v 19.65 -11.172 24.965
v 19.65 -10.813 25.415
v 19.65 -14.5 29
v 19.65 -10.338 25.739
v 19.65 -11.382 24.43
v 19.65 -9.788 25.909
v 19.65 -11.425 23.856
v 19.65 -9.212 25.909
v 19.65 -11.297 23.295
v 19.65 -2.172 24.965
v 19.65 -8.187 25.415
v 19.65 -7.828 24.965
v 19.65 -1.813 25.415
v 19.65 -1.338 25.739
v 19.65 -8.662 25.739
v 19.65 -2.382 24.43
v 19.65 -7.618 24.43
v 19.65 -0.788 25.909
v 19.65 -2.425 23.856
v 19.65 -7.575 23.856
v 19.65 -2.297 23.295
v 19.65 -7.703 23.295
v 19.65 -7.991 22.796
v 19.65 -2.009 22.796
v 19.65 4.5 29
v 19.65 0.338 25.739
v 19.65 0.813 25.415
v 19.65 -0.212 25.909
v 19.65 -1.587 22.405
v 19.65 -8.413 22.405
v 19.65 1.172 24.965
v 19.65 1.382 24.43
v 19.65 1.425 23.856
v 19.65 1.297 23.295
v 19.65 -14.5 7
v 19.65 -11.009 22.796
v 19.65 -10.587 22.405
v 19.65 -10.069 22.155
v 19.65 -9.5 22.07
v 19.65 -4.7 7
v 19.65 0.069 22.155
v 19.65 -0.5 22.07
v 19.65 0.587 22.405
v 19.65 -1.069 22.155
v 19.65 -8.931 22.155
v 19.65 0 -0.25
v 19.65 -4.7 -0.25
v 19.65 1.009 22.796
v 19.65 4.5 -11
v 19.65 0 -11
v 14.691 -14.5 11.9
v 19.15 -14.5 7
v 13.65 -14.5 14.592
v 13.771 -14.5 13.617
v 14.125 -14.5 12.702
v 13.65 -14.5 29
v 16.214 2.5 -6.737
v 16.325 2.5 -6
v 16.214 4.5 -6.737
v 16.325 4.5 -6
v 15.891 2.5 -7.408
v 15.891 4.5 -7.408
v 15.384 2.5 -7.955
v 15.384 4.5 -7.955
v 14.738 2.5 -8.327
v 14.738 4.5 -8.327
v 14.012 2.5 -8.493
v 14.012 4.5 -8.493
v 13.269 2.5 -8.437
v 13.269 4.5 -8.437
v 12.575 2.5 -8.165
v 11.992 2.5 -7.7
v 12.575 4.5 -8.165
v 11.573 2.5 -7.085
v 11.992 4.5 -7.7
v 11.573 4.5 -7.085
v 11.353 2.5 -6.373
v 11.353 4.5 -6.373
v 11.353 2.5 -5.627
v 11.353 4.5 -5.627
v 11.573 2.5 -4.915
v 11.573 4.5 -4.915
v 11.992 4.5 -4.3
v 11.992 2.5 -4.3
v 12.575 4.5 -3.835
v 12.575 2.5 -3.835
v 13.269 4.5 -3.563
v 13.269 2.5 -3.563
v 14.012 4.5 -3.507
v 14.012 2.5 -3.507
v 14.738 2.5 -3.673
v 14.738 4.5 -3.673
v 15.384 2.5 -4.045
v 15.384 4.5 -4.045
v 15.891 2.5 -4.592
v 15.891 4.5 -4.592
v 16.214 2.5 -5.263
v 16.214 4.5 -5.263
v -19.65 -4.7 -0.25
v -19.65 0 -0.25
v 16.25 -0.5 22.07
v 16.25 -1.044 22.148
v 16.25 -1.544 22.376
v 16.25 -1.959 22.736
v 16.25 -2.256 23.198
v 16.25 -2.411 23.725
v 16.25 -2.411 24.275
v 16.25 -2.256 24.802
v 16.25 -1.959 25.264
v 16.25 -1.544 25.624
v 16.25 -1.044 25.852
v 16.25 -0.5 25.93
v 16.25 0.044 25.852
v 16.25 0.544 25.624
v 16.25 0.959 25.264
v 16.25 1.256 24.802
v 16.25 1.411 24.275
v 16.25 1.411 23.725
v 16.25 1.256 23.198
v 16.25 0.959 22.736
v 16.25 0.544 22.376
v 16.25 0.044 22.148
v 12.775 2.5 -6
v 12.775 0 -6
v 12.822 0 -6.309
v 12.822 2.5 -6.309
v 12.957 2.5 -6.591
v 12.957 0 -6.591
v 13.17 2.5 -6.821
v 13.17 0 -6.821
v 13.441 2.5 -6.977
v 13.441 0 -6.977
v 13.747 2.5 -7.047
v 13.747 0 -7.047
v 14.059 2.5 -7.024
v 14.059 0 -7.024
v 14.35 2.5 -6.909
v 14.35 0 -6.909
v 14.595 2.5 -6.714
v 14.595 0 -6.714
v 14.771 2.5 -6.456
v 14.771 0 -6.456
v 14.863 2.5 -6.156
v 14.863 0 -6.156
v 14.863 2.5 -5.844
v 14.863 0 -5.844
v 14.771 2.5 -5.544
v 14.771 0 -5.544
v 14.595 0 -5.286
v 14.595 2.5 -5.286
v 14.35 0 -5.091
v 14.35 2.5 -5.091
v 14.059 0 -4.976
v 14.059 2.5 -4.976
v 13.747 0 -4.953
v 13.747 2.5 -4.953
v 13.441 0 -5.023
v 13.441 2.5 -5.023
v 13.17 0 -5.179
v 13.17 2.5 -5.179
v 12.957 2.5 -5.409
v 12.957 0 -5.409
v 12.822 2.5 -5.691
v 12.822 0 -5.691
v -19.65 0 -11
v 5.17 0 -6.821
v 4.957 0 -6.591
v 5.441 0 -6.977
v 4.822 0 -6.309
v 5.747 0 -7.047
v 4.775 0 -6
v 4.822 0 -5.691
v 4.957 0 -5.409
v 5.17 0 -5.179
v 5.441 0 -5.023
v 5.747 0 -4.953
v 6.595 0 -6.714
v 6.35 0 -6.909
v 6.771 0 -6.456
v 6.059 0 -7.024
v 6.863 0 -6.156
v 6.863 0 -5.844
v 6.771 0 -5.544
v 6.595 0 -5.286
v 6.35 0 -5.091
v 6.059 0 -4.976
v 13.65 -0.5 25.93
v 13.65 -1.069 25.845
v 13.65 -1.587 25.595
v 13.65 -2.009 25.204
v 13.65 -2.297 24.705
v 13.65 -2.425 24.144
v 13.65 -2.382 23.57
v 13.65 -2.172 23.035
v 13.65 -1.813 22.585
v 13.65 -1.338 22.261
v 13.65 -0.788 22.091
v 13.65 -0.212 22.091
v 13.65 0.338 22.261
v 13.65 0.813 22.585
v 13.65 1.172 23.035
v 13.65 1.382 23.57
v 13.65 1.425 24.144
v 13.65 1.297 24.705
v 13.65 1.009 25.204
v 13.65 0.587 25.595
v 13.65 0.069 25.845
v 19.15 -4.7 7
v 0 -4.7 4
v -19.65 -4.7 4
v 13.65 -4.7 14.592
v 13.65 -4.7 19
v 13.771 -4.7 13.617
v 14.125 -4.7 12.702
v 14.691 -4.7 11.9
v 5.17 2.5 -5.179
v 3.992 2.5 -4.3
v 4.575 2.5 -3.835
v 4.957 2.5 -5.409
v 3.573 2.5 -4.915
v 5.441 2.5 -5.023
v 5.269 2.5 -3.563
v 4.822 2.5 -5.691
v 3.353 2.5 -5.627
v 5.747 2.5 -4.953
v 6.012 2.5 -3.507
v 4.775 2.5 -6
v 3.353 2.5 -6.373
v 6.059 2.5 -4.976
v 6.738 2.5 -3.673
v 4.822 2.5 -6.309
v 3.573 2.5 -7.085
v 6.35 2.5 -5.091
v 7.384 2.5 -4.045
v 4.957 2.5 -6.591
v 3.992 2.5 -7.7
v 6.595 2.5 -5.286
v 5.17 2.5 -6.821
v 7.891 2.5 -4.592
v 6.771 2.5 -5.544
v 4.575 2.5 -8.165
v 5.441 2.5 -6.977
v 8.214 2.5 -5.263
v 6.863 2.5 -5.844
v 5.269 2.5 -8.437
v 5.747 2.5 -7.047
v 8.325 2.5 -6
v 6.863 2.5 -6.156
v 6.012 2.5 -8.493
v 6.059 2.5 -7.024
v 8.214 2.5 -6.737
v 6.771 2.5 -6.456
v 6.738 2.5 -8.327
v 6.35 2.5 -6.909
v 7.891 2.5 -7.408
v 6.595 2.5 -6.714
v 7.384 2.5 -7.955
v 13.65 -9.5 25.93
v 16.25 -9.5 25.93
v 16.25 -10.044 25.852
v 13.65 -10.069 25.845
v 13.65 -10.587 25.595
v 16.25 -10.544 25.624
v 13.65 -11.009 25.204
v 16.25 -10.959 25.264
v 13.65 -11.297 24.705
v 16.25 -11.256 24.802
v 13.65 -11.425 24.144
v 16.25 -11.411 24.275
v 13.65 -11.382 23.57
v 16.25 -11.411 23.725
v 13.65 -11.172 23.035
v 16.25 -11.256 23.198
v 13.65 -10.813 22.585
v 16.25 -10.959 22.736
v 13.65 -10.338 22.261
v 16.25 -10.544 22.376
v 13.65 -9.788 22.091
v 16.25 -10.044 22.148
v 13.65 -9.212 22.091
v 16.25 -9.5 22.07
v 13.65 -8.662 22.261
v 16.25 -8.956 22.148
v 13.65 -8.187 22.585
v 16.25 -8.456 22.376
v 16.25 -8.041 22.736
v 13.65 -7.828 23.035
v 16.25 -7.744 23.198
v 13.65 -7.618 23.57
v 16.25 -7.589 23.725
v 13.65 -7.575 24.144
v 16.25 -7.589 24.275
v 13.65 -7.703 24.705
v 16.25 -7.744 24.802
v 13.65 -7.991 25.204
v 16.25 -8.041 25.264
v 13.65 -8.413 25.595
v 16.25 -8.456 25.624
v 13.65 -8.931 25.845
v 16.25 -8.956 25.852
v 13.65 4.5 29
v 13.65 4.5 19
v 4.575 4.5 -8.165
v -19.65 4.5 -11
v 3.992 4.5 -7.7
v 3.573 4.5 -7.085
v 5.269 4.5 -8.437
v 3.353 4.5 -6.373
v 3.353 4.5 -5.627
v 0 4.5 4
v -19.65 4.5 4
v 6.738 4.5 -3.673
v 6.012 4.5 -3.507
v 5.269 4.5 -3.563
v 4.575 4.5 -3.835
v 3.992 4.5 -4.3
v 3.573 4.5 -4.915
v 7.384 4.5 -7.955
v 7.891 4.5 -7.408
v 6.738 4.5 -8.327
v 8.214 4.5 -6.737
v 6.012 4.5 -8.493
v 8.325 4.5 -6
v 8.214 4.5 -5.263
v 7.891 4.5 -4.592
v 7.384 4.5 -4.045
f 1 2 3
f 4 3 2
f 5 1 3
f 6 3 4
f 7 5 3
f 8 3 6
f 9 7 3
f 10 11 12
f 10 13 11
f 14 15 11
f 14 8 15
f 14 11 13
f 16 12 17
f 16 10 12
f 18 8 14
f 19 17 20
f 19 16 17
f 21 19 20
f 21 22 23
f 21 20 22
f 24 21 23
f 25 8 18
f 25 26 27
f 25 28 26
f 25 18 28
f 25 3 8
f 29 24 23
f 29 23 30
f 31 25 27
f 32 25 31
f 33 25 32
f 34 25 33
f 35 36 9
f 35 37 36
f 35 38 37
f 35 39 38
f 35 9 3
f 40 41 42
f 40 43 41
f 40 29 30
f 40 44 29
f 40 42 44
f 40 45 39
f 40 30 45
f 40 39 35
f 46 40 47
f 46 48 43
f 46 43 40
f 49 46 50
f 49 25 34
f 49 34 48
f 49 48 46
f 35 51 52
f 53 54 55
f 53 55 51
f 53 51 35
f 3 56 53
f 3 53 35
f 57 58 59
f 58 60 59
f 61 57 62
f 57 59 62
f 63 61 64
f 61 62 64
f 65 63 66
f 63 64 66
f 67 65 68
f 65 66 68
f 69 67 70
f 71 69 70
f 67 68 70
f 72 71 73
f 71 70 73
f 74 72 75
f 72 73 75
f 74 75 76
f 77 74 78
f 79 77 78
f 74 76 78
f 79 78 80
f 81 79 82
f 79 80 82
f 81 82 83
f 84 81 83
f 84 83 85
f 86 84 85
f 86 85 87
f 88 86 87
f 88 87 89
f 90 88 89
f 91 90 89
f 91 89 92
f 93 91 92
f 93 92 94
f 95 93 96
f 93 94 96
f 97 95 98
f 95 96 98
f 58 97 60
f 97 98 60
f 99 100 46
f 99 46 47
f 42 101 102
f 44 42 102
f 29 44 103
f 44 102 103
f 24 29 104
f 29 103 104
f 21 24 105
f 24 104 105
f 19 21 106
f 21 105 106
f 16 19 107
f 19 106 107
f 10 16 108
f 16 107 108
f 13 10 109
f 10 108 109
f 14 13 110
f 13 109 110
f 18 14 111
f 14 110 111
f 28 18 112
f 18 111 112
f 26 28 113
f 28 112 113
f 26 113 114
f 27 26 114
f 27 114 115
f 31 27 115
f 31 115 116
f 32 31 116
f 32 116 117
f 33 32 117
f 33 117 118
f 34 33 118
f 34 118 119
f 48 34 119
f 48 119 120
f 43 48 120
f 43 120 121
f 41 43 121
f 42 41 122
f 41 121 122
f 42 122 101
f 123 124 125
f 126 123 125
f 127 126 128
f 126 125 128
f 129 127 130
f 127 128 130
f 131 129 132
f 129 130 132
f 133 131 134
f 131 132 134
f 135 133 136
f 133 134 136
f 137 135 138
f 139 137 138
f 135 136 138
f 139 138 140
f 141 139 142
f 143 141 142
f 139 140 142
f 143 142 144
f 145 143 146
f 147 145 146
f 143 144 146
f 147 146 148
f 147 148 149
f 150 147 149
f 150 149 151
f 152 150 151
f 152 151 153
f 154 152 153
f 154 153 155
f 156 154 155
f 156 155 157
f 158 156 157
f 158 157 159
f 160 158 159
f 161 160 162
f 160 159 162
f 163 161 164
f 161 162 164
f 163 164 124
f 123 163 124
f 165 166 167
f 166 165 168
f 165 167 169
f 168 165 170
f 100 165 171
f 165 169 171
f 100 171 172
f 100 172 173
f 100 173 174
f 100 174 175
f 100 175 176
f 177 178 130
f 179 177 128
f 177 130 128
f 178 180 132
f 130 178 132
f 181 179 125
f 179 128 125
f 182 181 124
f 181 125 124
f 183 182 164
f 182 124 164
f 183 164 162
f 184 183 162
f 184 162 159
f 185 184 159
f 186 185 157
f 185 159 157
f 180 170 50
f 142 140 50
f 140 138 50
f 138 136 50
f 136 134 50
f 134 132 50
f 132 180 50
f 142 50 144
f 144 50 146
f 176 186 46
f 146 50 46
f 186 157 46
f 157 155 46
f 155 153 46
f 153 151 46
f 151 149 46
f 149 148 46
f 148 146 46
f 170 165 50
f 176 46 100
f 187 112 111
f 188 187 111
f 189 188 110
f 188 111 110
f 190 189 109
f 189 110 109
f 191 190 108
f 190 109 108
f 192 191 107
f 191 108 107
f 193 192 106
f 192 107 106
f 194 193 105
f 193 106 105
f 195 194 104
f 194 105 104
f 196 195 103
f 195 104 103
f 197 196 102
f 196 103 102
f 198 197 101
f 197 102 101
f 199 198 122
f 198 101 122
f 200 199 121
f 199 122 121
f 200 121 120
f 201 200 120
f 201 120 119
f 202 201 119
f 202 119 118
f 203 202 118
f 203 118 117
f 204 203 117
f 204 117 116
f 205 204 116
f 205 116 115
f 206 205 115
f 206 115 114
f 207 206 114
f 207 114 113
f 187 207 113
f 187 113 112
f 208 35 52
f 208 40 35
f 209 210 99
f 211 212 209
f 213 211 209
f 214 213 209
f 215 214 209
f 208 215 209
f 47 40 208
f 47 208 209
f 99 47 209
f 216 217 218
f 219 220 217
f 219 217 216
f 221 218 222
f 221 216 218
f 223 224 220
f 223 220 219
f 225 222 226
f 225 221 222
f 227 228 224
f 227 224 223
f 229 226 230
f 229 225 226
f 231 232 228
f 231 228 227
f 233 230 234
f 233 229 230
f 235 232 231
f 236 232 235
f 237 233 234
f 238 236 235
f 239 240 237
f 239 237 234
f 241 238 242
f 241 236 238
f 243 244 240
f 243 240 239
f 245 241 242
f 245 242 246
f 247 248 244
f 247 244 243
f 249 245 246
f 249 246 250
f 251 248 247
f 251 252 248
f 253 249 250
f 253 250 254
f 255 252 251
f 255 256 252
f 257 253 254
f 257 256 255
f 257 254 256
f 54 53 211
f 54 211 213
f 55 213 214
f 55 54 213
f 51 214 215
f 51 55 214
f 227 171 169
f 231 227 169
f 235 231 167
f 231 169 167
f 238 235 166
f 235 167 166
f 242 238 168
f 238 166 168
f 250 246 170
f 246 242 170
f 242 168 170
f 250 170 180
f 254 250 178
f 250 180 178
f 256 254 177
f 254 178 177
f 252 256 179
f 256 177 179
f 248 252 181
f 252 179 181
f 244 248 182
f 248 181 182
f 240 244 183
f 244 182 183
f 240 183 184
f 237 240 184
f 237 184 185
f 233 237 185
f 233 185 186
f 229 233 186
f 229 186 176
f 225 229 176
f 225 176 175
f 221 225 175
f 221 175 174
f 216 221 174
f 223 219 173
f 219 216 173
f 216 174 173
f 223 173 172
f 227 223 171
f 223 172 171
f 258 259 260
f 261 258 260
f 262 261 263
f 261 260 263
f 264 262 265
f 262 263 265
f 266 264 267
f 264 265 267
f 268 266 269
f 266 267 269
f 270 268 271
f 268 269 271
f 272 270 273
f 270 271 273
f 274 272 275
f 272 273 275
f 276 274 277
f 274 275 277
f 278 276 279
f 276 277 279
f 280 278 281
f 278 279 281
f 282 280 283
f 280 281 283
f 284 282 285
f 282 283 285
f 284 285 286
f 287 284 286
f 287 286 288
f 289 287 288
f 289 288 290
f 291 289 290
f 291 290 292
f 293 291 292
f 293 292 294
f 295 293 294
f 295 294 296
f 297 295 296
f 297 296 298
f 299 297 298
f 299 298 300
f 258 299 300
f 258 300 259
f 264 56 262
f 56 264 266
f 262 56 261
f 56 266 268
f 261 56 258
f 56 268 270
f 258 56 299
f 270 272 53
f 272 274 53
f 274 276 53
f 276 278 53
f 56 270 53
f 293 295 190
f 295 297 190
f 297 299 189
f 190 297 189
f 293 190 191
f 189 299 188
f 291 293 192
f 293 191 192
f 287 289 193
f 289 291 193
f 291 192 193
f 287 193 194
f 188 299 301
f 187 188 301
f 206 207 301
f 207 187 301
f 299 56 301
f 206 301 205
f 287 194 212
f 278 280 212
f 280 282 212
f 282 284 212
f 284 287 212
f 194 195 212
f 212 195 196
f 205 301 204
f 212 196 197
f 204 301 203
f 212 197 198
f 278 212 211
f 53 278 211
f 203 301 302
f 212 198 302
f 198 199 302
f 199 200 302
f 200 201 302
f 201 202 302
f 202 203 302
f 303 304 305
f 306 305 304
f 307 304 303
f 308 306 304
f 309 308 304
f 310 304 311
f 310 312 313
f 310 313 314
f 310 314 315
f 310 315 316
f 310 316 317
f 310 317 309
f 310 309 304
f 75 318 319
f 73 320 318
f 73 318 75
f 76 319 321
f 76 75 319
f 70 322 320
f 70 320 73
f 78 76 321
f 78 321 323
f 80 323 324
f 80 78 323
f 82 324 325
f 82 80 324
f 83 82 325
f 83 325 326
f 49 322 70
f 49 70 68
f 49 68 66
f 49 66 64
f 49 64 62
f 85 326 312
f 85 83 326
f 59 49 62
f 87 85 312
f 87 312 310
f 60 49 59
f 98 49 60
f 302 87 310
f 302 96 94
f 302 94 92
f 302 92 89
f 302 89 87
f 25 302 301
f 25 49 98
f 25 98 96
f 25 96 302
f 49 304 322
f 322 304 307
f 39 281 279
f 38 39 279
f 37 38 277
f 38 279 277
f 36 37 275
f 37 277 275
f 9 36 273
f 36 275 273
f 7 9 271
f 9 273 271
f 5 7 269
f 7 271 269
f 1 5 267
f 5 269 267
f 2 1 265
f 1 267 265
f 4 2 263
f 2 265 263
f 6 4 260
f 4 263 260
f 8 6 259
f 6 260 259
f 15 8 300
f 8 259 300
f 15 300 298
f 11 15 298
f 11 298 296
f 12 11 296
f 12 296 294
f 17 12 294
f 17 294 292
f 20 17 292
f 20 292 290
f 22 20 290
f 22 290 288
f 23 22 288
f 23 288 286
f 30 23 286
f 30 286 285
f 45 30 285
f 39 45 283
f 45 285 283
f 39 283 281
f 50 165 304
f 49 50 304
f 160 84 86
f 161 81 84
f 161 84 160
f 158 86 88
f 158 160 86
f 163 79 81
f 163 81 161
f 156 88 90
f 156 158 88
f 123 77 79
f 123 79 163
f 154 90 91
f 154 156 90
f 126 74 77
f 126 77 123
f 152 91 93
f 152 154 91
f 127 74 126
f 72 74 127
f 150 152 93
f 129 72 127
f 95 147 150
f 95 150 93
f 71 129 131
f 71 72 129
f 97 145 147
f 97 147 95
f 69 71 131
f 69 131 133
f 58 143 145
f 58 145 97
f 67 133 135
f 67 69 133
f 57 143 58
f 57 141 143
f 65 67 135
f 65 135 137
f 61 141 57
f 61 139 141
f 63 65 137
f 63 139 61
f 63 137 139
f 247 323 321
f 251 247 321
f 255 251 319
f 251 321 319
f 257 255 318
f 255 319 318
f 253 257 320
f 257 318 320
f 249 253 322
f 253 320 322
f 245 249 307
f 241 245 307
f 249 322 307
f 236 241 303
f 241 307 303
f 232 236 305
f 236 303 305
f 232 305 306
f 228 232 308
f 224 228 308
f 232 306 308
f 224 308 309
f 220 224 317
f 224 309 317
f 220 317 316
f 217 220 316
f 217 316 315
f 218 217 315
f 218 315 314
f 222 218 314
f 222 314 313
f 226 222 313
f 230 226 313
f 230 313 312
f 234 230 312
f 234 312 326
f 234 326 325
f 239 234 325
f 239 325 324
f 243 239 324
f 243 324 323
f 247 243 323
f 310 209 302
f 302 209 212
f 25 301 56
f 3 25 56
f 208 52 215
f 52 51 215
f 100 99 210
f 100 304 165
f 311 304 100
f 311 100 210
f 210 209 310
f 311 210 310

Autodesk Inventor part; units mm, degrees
ref_plane "YZ Plane" through (0, 0, 0) normal (1, 0, 0) x (0, 1, 0)
ref_plane "XZ Plane" through (0, 0, 0) normal (0, 1, 0) x (-1, 0, 0)
ref_plane "XY Plane" through (0, 0, 0) normal (0, 0, 1) x (1, 0, 0)
sketch "Sketch1" plane through (0, 0, 0) normal (0, 1, 0) x (-1, 0, 0)
  line L0 (0, 0) -> (-19.65, 0)
  line L1 (-19.65, 0) -> (-19.65, -12)
  line L2 (-19.65, -12) -> (0, -12)
  line L3 (0, -12) -> (0, 0)
  line L4 (0, 0) -> (0, -6)
  line L5 (0, -6) -> (-5.825, -6)
  line L6 (-5.825, -6) -> (-13.825, -6)
  circle A0 centre (-5.825, -6) radius 1.05
  circle A1 centre (-13.825, -6) radius 1.05
  dimension "d0" = 19.65
  dimension "d1" = 12
  dimension "d2" = 6
  dimension "d3" = 5.825
  dimension "d4" = 8
  dimension "d5" = 2.1
  dimension "d6" = 2.1
extrude "Extrusion1" add sketch "Sketch1" along normal blind 4.5
sketch "Sketch2" plane through (0, 4.5, 0) normal (0, 1, 0) x (1, 0, 0)
  line L0 (0, 0) -> (19.65, 0) projected
  line L1 (0, 0) -> (0, 6)
  line L2 (0, 12) -> (0, 0) projected
  line L3 (0, 6) -> (5.825, 6)
  line L4 (5.825, 6) -> (13.825, 6)
  circle A0 centre (5.825, 6) radius 2.5
  circle A1 centre (13.825, 6) radius 2.5
  dimension "d9" = 5.825
  dimension "d10" = 8
  dimension "d11" = 5
  dimension "d12" = 5
extrude "Extrusion2" cut sketch "Sketch2" against normal blind 2
sketch "Sketch3" plane through (0, 4.5, 0) normal (0, 1, 0) x (1, 0, 0)
  line L0 (19.65, 12) -> (0, 12) projected
  line L1 (0, 0) -> (3, 0)
  line L2 (3, 0) -> (3, 12)
  line L3 (3, 12) -> (0, 12)
  line L4 (0, 12) -> (0, 0)
  dimension "d15" = 3
extrude "Extrusion3" add sketch "Sketch3" along normal blind 11.5
sketch "Sketch4" plane through (0, 16, 0) normal (0, 1, 0) x (1, 0, 0)
  line L0 (0, 0) -> (3, 0) projected
  line L1 (0, 0) -> (3, 0)
  line L2 (3, 0) -> (3, 1)
  line L3 (3, 0) -> (3, 12) projected
  line L4 (3, 1) -> (2, 1)
  line L5 (2, 1) -> (2, 11)
  line L6 (2, 11) -> (3, 11)
  line L7 (3, 1) -> (3, 11)
  dimension "d18" = 1
  dimension "d19" = 1
  dimension "d20" = 10
extrude "Extrusion4" cut sketch "Sketch4" against normal blind 11.5
sketch "Sketch6" plane through (0, 0, 0) normal (0, 0, 1) x (1, 0, 0)
  line L0 (0, 0) -> (19.65, 0) projected
  line L1 (0, 0) -> (5, 0)
  line L2 (5, 0) -> (5, 4.5)
  line L3 (3.325, 4.5) -> (8.325, 4.5) projected
  line L4 (19.65, 0) -> (19.65, 4.5) projected
  line L5 (19.65, 4.5) -> (19.65, 0)
  line L6 (19.65, 0) -> (5, 0)
  line L7 (5, 4.5) -> (19.65, 4.5)
  line L8 (19.65, 0) -> (5, 0)
  line L9 (19.65, 4.5) -> (19.65, -3.5)
  line L10 (5, 4.5) -> (-3, 4.5)
  line L11 (3, 4.5) -> (19.65, 4.5) projected
  line L12 (5, 4.5) -> (5, -3.5)
  line L13 (5, -3.5) -> (19.65, -3.5)
  dimension "d24" = 5
  dimension "d25" = 8
  dimension "d26" = 8
  dimension "d27" = 8
extrude "Extrusion5" add sketch "Sketch6" along normal blind 2
sketch "Sketch7" plane through (0, 0, 2) normal (0, 0, 1) x (1, 0, 0)
  line L0 (5, 0) -> (5, -3.5) projected
  line L1 (5, -3.5) -> (11, -3.5)
  line L2 (11, -3.5) -> (11, 4.5)
  line L3 (11, 4.5) -> (5, 4.5)
  line L4 (5, 4.5) -> (5, -3.5)
  line L5 (5, -3.5) -> (19.65, -3.5) projected
  line L6 (5, -3.5) -> (11, -3.5)
  line L7 (11, -3.5) -> (11, -14.5)
  line L8 (11, -14.5) -> (5, -14.5)
  line L9 (5, -14.5) -> (5, -3.5)
  point P0 (0, 0)
  dimension "d30" = 6
  dimension "d31" = 8
  dimension "d32" = 6
  dimension "d33" = 11
extrude "Extrusion6" add sketch "Sketch7" along normal blind 27
sketch "Sketch8" plane through (11, -14.5, 2) normal (1, 0, 0) x (0, 0, -1)
  line L0 (0, 11) -> (0, 0) projected
  line L1 (0, 0) -> (-27, 0)
  line L2 (0, 0) -> (-27, 0) projected
  line L3 (-27, 0) -> (-27, 5)
  line L4 (2, 19) -> (-27, 19) projected
  circle A0 centre (-27, 5) radius 2
  line L5 (0, 19) -> (-27, 19)
  line L6 (-27, 19) -> (-27, 14)
  circle A1 centre (-27, 14) radius 2
  line L7 (-27, 14) -> (-22, 14)
  line L8 (-27, 5) -> (-22, 5)
  circle A2 centre (-22, 14) radius 1.9305
  circle A3 centre (-22, 5) radius 1.9305
  point P0 (2, 14.5)
  point P1 (-25, 14)
  point P2 (-27, 16)
  point P3 (-25, 5)
  point P4 (-27, 3)
  dimension "d36" = 27
  dimension "d37" = 5
  dimension "d39" = 4
  dimension "d41" = 27
  dimension "d42" = 5
  dimension "d43" = 4
  dimension "d44" = 5
  dimension "d45" = 5
  dimension "d46" = 3.861
  dimension "d47" = 3.861
sketch "Sketch10" plane through (11, -14.5, 2) normal (1, 0, 0) x (0, 0, -1)
  line L0 (0, 0) -> (-27, 0) projected
  line L1 (0, 0) -> (-5, 0)
  line L2 (-5, 0) -> (-5, 11)
  line L3 (-5, 11) -> (0, 11)
  line L4 (0, 11) -> (0, 0)
  point P0 (2, 14.5)
  point P1 (-5, 0)
  dimension "d52" = 5
  dimension "d53" = 11
extrude "Extrusion9" cut sketch "Sketch10" against normal blind 20
sketch "Sketch11" plane through (11, -3.5, 2) normal (1, 0, 0) x (0, 0, -1)
  line L0 (-27, 8) -> (0, 8)
  line L1 (0, 8) -> (0, -11)
  line L2 (0, -11) -> (-27, -11)
  line L3 (-27, -11) -> (-27, 8)
  line L4 (-5, 0) -> (0, 0) projected
  line L5 (-5, 0) -> (0, 0)
  line L6 (0, 0) -> (0, -11)
  line L7 (0, -11) -> (-5, -11)
  line L8 (-5, -11) -> (-5, 0)
  point P0 (2, 3.5)
  dimension "d56" = 27
  dimension "d57" = 19
extrude "Extrusion10" add sketch "Sketch11" along normal blind 16 contours L0 L1 L4 L8 L2 L3
sketch "Sketch13" plane through (5, -3.5, 0) normal (-1, 0, 0) x (0, 0, 1)
  line L0 (0, 3.5) -> (0, 8) projected
  line L1 (0, 8) -> (30.196, 8)
  line L2 (30.196, 8) -> (30.196, -11.8084)
  line L3 (30.196, -11.8084) -> (0, -11.8084)
  line L4 (0, -11.8084) -> (0, 8)
extrude "Extrusion12" cut sketch "Sketch13" against normal blind 12.5
extrude "Extrusion13" cut sketch "Sketch8" along normal blind 30 contours A2 | A3
sketch "Sketch14" plane through (0, 0, -12) normal (-1, 0, 0) x (0, 0, 1)
  line L0 (12, 4.5) -> (12, 16) projected
  line L1 (12, 4.5) -> (16, 4.5)
  line L2 (14, 4.5) -> (41, 4.5) projected
  line L3 (12, 4.5) -> (12, 0) projected
  line L4 (16, 4.5) -> (12, 4.5)
  line L5 (12, 4.5) -> (12, 0)
  line L6 (12, 0) -> (16, 0)
  line L7 (16, 0) -> (16, 4.5)
  line L8 (16, 0) -> (12, 0)
  line L9 (12, 0) -> (12, -3.5)
  line L10 (12, -3.5) -> (16, -3.5)
  line L11 (16, -3.5) -> (16, 0)
  dimension "d68" = 4
  dimension "d69" = 3.5
extrude "Extrusion14" add sketch "Sketch14" against normal blind 27
sketch "Sketch15" plane through (27, -3.5, 2) normal (1, 0, 0) x (0, 0, -1)
  line L0 (-27.7224, 9.1153) -> (2, 9.1153)
  line L1 (2, 9.1153) -> (2, -11.9629)
  line L2 (2, -11.9629) -> (-27.7224, -11.9629)
  line L3 (-27.7224, -11.9629) -> (-27.7224, 9.1153)
  point P0 (2, 3.5)
extrude "Extrusion15" cut sketch "Sketch15" against normal blind 3.5
sketch "Sketch16" plane through (0, 0, 0) normal (0, 0, -1) x (-1, 0, 0)
  line L0 (-23.5, 4.5) -> (-23.5, -3.5) projected
  line L1 (-19.65, 0) -> (0, 0) projected
  line L2 (-23.5, 4.5) -> (-19.65, 4.5)
  line L3 (-19.65, 4.5) -> (-19.65, 0)
  line L4 (-19.65, 0) -> (-23.5, 0)
  line L5 (-23.5, 0) -> (-23.5, 4.5)
  line L6 (0, -3.5) -> (-23.5, -3.5) projected
  line L7 (-23.5, -3.5) -> (0, -3.5)
  line L8 (0, -3.5) -> (0, 0)
  line L9 (0, 0) -> (-23.5, 0)
  line L10 (-23.5, 0) -> (-23.5, -3.5)
extrude "Extrusion16" cut sketch "Sketch16" against normal blind 0.25
chamfer "Chamfer2" distance 11.5 angle 22.5 1 edges at (3, 4.5, -0.5) measured on face at (3, 8.3333, -0.6667)
chamfer "Chamfer3" distance 11.5 angle 22.5 1 edges at (3, 4.5, -11.5) measured on face at (3, 8.3333, -11.3333)
sketch "Sketch17" plane through (17.5, -3.5, 0) normal (-1, 0, 0) x (0, 0, 1)
  line L0 (4, 8) -> (0, 8) projected
  line L1 (4, 8) -> (29, 8) projected
  line L2 (4, 8) -> (29, 8)
  line L3 (29, -11) -> (7, -11) projected
  line L4 (29, 8) -> (29, -11)
  line L5 (29, -11) -> (7, -11)
  line L6 (7, -11) -> (7, 0) projected
  line L7 (7, -11) -> (7, 0)
  line L8 (7, 0) -> (4, 0) projected
  line L9 (7, 0) -> (4, 0)
  line L10 (4, 0) -> (4, 8) projected
  line L11 (4, 0) -> (4, 8)
  circle A0 centre (24, 3) radius 1.9305 projected
  circle A1 centre (24, 3) radius 1.9305
  circle A2 centre (24, -6) radius 1.9305 projected
  circle A3 centre (24, -6) radius 1.9305
  point P0 (0, 3.5)
extrude "Extrusion17" add sketch "Sketch17" along normal blind 7.75
sketch "Sketch19" plane through (19.65, 0, -12) normal (1, 0, 0) x (0, 0, -1)
  line L0 (3.0047, 17.6779) -> (-43.6886, 17.6779)
  line L1 (-43.6886, 17.6779) -> (-43.6886, -24.1526)
  line L2 (-43.6886, -24.1526) -> (3.0047, -24.1526)
  line L3 (3.0047, -24.1526) -> (3.0047, 17.6779)
  point P0 (-12, 0)
extrude "Extrusion18" cut sketch "Sketch19" along normal blind 7.75
sketch "Sketch20" plane through (19.65, 0, -12) normal (1, 0, 0) x (0, 0, -1)
  line L0 (-16, -3.5) -> (-19, -3.5) projected
  line L1 (-41, 4.5) -> (-16, 4.5) projected
  line L2 (-16, -3.5) -> (-41, -3.5)
  line L3 (-41, -3.5) -> (-41, 4.5)
  line L4 (-41, 4.5) -> (-16, 4.5)
  line L5 (-16, 4.5) -> (-16, -3.5)
  line L6 (-19, -3.5) -> (-19, -14.5) projected
  line L7 (0, 4.5) -> (-41, 4.5) projected
  line L8 (-19, -14.5) -> (-41, -14.5)
  line L9 (-41, -14.5) -> (-41, 4.5)
  line L10 (-41, 4.5) -> (-19, 4.5)
  line L11 (-19, 4.5) -> (-19, -14.5)
  point P0 (-12, 0)
extrude "Extrusion19" cut sketch "Sketch20" against normal blind 3.4
sketch "Sketch22" plane through (9.75, -3.5, 0) normal (-1, 0, 0) x (0, 0, 1)
  line L0 (29, 8) -> (4, 8) projected
  line L1 (29, -11) -> (29, 8) projected
  line L2 (4, 8) -> (29, 8)
  line L3 (29, 8) -> (29, -11)
  line L4 (29, -11) -> (4, -11)
  line L5 (4, -11) -> (4, 8)
  point P0 (0, 3.5)
extrude "Extrusion21" cut sketch "Sketch22" against normal blind 0.5
chamfer "Chamfer6" distance 6 angle 45 1 edges at (10.25, 0.5, 4)
sketch "Sketch23" plane through (10.25, -3.5, 0) normal (-1, 0, 0) x (0, 0, 1)
  line L0 (0.25, 0) -> (4, 0) projected
  line L1 (29, -11) -> (0.25, -11)
  line L2 (0.25, -11) -> (0.25, 0)
  line L3 (0.25, 0) -> (29, 0)
  line L4 (29, 0) -> (29, -11)
  point P0 (0, 3.5)
extrude "Extrusion22" cut sketch "Sketch23" along normal blind 6
chamfer "Chamfer7" distance 3 angle 45 1 edges at (10.25, -9, 7)
sketch "Sketch24" plane through (2, 4.5, -11) normal (0, 0, 1) x (1, 0, 0)
  line L0 (0, 11.5) -> (0, 0) projected
  line L1 (0, 11.5) -> (1, 11.5) projected
  line L2 (0, 11.5) -> (1, 11.5)
  line L3 (1, 11.5) -> (5.7635, 0) projected
  line L4 (1, 11.5) -> (5.7635, 0)
  line L5 (5.7635, 0) -> (0, 0)
  line L6 (0, 0) -> (0, 11.5)
  point P0 (-2, -4.5)
extrude "Extrusion23" add sketch "Sketch24" along normal blind 1
sketch "Sketch25" plane through (19.65, 0, -12) normal (0, 0, -1) x (-1, 0, 0)
  line L0 (11.8865, 4.5) -> (16.65, 16) projected
  line L1 (11.8865, 4.5) -> (21.5602, 4.5)
  line L2 (21.5602, 4.5) -> (21.5602, 16.6717)
  line L3 (21.5602, 16.6717) -> (11.8865, 16.6717)
  line L4 (11.8865, 16.6717) -> (11.8865, 4.5)
  point P0 (19.65, 0)
extrude "Extrusion24" cut sketch "Sketch25" against normal blind 1
sketch "Sketch26" plane through (19.65, 0, -12) normal (0, 0, -1) x (-1, 0, 0)
  line L0 (23.0227, -5.5896) -> (-3.5888, -5.5896)
  line L1 (-3.5888, -5.5896) -> (-3.5888, 1.5983)
  line L2 (23.0227, 1.5983) -> (23.0227, -5.5896)
  line L3 (23.0227, -5.5896) -> (-3.178, -5.5896)
  line L4 (-3.178, -5.5896) -> (-3.178, 11.4907)
  line L5 (-3.178, 11.4907) -> (23.0227, 11.4907)
  line L6 (23.0227, 11.4907) -> (23.0227, -5.5896)
  point P0 (19.65, 0)
extrude "Extrusion25" cut sketch "Sketch26" against normal blind 1
sketch "Sketch27" plane through (0, 0, 0.25) normal (0, 0, -1) x (-1, 0, 0)
  line L0 (-19.65, 0) -> (0, 0) projected
  line L1 (-19.65, -3.5) -> (-16.25, -3.5) projected
  line L2 (0, 0) -> (-19.65, 0)
  line L3 (-19.65, 0) -> (-19.65, -3.5)
  line L4 (-19.65, -3.5) -> (0, -3.5)
  line L5 (0, -3.5) -> (0, 0)
extrude "Extrusion26" add sketch "Sketch27" along normal blind 0.25
sketch "Sketch28" plane through (0, 0, 0) normal (0, 0, -1) x (-1, 0, 0)
  line L0 (0, 0) -> (-19.65, 0) projected
  line L1 (-19.65, 0) -> (-19.65, -3.5) projected
  line L2 (0, 0) -> (-19.65, 0)
  line L3 (-19.65, 0) -> (-19.65, -3.5)
  line L4 (-19.65, -3.5) -> (0, -3.5)
  line L5 (0, -3.5) -> (0, 0)
extrude "Extrusion27" add sketch "Sketch28" along normal blind 0.25
sketch "Sketch29" plane through (16.25, 0, -12) normal (1, 0, 0) x (0, 0, -1)
  line L0 (-16, -3.5) -> (-16, 4.5) projected
  line L1 (-19, -14.5) -> (-41, -14.5) projected
  line L2 (-16, 4.5) -> (-41, 4.5)
  line L3 (-41, 4.5) -> (-41, -14.5)
  line L4 (-41, -14.5) -> (-16, -14.5)
  line L5 (-16, -14.5) -> (-16, 4.5)
  line L6 (-19, -3.5) -> (-19, -14.5) projected
  line L7 (-19, -3.5) -> (-16, -3.5)
  line L8 (-16, -3.5) -> (-16, -14.5)
  line L9 (-16, -14.5) -> (-19, -14.5)
  line L10 (-19, -14.5) -> (-19, -3.5)
  circle A0 centre (-36, -0.5) radius 1.9305 projected
  circle A1 centre (-36, -0.5) radius 1.9305
  circle A2 centre (-36, -9.5) radius 1.9305 projected
  circle A3 centre (-36, -9.5) radius 1.9305
  point P0 (-12, 0)
extrude "Extrusion28" add sketch "Sketch29" along normal blind 3.4 contours L7 L6 L1 L3 L2 L0
sketch "Sketch30" plane through (0, -3.5, 4) normal (0, -1, 0) x (1, 0, 0)
  line L0 (19.65, 3) -> (19.65, -4.25) projected
  line L1 (0, -15) -> (0, -4.25) projected
  line L2 (0, 3) -> (0, -4.25)
  line L3 (0, -4.25) -> (19.65, -4.25)
  line L4 (19.65, -4.25) -> (19.65, 3)
  line L5 (10.25, 6) -> (13.25, 3) projected
  line L6 (13.25, 3) -> (10.25, 6)
  line L7 (10.25, 6) -> (7.25, 3)
  line L8 (10.25, 6) -> (4.25, 0) projected
  line L9 (0, 0) -> (4.25, 0) projected
  line L10 (7.25, 3) -> (4.25, 0)
  line L11 (19.65, 3) -> (13.25, 3)
  line L12 (7.25, 3) -> (0, 3)
  point P0 (0, -4)
extrude "Extrusion29" add sketch "Sketch30" along normal blind 1.2 contours L0 L3 L2 L9 L8 L7 L5 L11
sketch "Sketch31" plane through (10.25, -3.5, 0) normal (-1, 0, 0) x (0, 0, 1)
  line L0 (29, 8) -> (29, -11) projected
  line L1 (29, -11) -> (10, -11) projected
  line L2 (29, 8) -> (19, 8)
  line L3 (19, 8) -> (19, -11)
  line L4 (19, -11) -> (29, -11)
  line L5 (29, -11) -> (29, 8)
  point P0 (0, 3.5)
  dimension "d126" = 10
extrude "Extrusion30" cut sketch "Sketch31" against normal blind 3.4
sketch "Sketch32" plane through (0, 4.5, 0) normal (0, 1, 0) x (1, 0, 0)
  line L0 (13.65, -19) -> (10.25, -19) projected
  line L1 (10.25, -19) -> (10.25, -10) projected
  line L2 (13.65, -19) -> (10.25, -10)
  line L3 (10.25, -10) -> (7.9334, -20.7068)
  line L4 (7.9334, -20.7068) -> (13.65, -19)
  point P0 (0, 0)
extrude "Extrusion31" cut sketch "Sketch32" against normal blind 20 contours L0 L1 L2
sketch "Sketch38" plane through (0, -4.7, 4) normal (0, -1, 0) x (1, 0, 0)
  line L0 (13.65, 15) -> (13.65, 3)
  line L1 (13.25, 3) -> (19.65, 3) projected
  line L2 (13.65, 3) -> (6.6933, 3)
  line L3 (10.25, 6) -> (13.65, 15) projected
  line L4 (6.6933, 3) -> (13.65, 15)
  point P0 (0, -4)
extrude "Extrusion35" cut sketch "Sketch38" along normal blind 20
sketch "Sketch39" plane through (0, -4.7, 4) normal (0, -1, 0) x (1, 0, 0)
  line L0 (10.25, 6) -> (13.65, 15) projected
  line L1 (10.25, 6) -> (10.9568, 7.8709)
  line L2 (10.9568, 7.8709) -> (13.65, 7.8709)
  line L3 (13.65, 3) -> (13.65, 15) projected
  line L4 (13.65, 3) -> (10.9568, 3)
  line L5 (10.9568, 3) -> (10.9568, 7.8709)
  line L6 (10.9568, 7.8709) -> (13.65, 7.8709)
  line L7 (13.65, 7.8709) -> (13.65, 3)
  point P0 (0, -4)
  dimension "d150" = 2
extrude "Extrusion36" add sketch "Sketch39" along normal blind 9.8 contours L2 L3 L4 L5
sketch "Sketch40" plane through (0, -4.7, 4) normal (0, -1, 0) x (1, 0, 0)
  line L0 (10.25, 6) -> (10.9568, 7.8709) projected
  line L1 (13.65, 25) -> (13.65, 7.8709) projected
  line L2 (10.9568, 7.8709) -> (13.65, 7.8709)
  line L3 (13.65, 15) -> (13.65, 25) projected
  line L4 (13.65, 7.8709) -> (13.65, 15)
  line L5 (10.9568, 7.8709) -> (13.65, 15) projected
  line L6 (13.65, 15) -> (10.9568, 7.8709)
  point P0 (0, -4)
extrude "Extrusion37" add sketch "Sketch40" along normal blind 9.8
sketch "Sketch42" plane through (0, -4.7, 4) normal (0, -1, 0) x (1, 0, 0)
  line L0 (4.25, 0) -> (0, 0) projected
  line L1 (10.25, 6) -> (13.65, 15) projected
  line L2 (0, 0) -> (13.65, 15)
  line L3 (13.65, 15) -> (13.65, 4.5)
  line L4 (13.65, 4.5) -> (6.0124, 0)
  line L5 (0, 0) -> (4.25, 0) projected
  line L6 (6.0124, 0) -> (0, 0)
  point P0 (0, -4)
extrude "Extrusion38" add sketch "Sketch42" against normal blind 9.2
sketch "Sketch45" plane through (19.65, -14.5, 7) normal (0, -1, 0) x (1, 0, 0)
  line L0 (-6, 12) -> (-19.65, -3) projected
  line L1 (-6, 12) -> (-11.8966, 12)
  line L2 (-11.8966, 12) -> (-11.8966, -1.0489)
  line L3 (-11.8966, -1.0489) -> (-6, -1.0489)
  line L4 (-6, -1.0489) -> (-6, 12)
  point P0 (-19.65, -7)
  point P1 (-11.8966, 5.5202)
extrude "Extrusion40" cut sketch "Sketch45" against normal blind 9.8 contours L4 L3 L2 L0
chamfer "Chamfer12" distance 5.5 angle 47.7 1 edges at (13.65, -9.6, 7) measured on face at (17.65, -11.2333, 7)
fillet "Fillet6" radius 4 1 edges at (13.65, -9.6, 13.0444)
sketch "Sketch46" plane through (0, 4.5, 0) normal (-1, 0, 0) x (0, 0, 1)
  line L0 (-11, 0) -> (29, 0) projected
  line L1 (-11, 0) -> (2.4776, 0)
  line L2 (2.4776, 0) -> (2.4776, 14.1747)
  line L3 (2.4776, 14.1747) -> (-11, 14.1747)
  line L4 (-11, 14.1747) -> (-11, 0)
  point P0 (0, -4.5)
  point P1 (2.4776, 0)
extrude "Extrusion41" cut sketch "Sketch46" against normal blind 40
sketch "Sketch47" plane through (0, 0, -11) normal (-1, 0, 0) x (0, 0, 1)
  line L0 (10.75, 0) -> (10.75, -4.7) projected
  line L1 (0, 0) -> (10.75, 0) projected
  line L2 (10.75, -4.7) -> (0, -4.7)
  line L3 (0, -4.7) -> (0, 0)
  line L4 (0, 0) -> (10.75, 0)
  line L5 (10.75, 0) -> (10.75, -4.7)
  line L6 (0, 0) -> (0, 4.5) projected
  line L7 (15, -4.7) -> (15, 4.5) projected
  line L8 (0, 4.5) -> (15, 4.5)
  line L9 (15, 4.5) -> (15, -4.7)
  line L10 (15, -4.7) -> (0, -4.7)
  line L11 (0, -4.7) -> (0, 4.5)
  point P0 (11, 0)
  point P1 (15, 4.5)
ref_plane "Work Plane1" through (0, 0, -11) normal (-1, 0, 0) x (0, 0, 1)
extrude "Extrusion42" add sketch "Sketch47" along normal blind 19.65 contours L1 L6 L8 L7 L10 L0
properties part number "Non_compliant_plate2"
